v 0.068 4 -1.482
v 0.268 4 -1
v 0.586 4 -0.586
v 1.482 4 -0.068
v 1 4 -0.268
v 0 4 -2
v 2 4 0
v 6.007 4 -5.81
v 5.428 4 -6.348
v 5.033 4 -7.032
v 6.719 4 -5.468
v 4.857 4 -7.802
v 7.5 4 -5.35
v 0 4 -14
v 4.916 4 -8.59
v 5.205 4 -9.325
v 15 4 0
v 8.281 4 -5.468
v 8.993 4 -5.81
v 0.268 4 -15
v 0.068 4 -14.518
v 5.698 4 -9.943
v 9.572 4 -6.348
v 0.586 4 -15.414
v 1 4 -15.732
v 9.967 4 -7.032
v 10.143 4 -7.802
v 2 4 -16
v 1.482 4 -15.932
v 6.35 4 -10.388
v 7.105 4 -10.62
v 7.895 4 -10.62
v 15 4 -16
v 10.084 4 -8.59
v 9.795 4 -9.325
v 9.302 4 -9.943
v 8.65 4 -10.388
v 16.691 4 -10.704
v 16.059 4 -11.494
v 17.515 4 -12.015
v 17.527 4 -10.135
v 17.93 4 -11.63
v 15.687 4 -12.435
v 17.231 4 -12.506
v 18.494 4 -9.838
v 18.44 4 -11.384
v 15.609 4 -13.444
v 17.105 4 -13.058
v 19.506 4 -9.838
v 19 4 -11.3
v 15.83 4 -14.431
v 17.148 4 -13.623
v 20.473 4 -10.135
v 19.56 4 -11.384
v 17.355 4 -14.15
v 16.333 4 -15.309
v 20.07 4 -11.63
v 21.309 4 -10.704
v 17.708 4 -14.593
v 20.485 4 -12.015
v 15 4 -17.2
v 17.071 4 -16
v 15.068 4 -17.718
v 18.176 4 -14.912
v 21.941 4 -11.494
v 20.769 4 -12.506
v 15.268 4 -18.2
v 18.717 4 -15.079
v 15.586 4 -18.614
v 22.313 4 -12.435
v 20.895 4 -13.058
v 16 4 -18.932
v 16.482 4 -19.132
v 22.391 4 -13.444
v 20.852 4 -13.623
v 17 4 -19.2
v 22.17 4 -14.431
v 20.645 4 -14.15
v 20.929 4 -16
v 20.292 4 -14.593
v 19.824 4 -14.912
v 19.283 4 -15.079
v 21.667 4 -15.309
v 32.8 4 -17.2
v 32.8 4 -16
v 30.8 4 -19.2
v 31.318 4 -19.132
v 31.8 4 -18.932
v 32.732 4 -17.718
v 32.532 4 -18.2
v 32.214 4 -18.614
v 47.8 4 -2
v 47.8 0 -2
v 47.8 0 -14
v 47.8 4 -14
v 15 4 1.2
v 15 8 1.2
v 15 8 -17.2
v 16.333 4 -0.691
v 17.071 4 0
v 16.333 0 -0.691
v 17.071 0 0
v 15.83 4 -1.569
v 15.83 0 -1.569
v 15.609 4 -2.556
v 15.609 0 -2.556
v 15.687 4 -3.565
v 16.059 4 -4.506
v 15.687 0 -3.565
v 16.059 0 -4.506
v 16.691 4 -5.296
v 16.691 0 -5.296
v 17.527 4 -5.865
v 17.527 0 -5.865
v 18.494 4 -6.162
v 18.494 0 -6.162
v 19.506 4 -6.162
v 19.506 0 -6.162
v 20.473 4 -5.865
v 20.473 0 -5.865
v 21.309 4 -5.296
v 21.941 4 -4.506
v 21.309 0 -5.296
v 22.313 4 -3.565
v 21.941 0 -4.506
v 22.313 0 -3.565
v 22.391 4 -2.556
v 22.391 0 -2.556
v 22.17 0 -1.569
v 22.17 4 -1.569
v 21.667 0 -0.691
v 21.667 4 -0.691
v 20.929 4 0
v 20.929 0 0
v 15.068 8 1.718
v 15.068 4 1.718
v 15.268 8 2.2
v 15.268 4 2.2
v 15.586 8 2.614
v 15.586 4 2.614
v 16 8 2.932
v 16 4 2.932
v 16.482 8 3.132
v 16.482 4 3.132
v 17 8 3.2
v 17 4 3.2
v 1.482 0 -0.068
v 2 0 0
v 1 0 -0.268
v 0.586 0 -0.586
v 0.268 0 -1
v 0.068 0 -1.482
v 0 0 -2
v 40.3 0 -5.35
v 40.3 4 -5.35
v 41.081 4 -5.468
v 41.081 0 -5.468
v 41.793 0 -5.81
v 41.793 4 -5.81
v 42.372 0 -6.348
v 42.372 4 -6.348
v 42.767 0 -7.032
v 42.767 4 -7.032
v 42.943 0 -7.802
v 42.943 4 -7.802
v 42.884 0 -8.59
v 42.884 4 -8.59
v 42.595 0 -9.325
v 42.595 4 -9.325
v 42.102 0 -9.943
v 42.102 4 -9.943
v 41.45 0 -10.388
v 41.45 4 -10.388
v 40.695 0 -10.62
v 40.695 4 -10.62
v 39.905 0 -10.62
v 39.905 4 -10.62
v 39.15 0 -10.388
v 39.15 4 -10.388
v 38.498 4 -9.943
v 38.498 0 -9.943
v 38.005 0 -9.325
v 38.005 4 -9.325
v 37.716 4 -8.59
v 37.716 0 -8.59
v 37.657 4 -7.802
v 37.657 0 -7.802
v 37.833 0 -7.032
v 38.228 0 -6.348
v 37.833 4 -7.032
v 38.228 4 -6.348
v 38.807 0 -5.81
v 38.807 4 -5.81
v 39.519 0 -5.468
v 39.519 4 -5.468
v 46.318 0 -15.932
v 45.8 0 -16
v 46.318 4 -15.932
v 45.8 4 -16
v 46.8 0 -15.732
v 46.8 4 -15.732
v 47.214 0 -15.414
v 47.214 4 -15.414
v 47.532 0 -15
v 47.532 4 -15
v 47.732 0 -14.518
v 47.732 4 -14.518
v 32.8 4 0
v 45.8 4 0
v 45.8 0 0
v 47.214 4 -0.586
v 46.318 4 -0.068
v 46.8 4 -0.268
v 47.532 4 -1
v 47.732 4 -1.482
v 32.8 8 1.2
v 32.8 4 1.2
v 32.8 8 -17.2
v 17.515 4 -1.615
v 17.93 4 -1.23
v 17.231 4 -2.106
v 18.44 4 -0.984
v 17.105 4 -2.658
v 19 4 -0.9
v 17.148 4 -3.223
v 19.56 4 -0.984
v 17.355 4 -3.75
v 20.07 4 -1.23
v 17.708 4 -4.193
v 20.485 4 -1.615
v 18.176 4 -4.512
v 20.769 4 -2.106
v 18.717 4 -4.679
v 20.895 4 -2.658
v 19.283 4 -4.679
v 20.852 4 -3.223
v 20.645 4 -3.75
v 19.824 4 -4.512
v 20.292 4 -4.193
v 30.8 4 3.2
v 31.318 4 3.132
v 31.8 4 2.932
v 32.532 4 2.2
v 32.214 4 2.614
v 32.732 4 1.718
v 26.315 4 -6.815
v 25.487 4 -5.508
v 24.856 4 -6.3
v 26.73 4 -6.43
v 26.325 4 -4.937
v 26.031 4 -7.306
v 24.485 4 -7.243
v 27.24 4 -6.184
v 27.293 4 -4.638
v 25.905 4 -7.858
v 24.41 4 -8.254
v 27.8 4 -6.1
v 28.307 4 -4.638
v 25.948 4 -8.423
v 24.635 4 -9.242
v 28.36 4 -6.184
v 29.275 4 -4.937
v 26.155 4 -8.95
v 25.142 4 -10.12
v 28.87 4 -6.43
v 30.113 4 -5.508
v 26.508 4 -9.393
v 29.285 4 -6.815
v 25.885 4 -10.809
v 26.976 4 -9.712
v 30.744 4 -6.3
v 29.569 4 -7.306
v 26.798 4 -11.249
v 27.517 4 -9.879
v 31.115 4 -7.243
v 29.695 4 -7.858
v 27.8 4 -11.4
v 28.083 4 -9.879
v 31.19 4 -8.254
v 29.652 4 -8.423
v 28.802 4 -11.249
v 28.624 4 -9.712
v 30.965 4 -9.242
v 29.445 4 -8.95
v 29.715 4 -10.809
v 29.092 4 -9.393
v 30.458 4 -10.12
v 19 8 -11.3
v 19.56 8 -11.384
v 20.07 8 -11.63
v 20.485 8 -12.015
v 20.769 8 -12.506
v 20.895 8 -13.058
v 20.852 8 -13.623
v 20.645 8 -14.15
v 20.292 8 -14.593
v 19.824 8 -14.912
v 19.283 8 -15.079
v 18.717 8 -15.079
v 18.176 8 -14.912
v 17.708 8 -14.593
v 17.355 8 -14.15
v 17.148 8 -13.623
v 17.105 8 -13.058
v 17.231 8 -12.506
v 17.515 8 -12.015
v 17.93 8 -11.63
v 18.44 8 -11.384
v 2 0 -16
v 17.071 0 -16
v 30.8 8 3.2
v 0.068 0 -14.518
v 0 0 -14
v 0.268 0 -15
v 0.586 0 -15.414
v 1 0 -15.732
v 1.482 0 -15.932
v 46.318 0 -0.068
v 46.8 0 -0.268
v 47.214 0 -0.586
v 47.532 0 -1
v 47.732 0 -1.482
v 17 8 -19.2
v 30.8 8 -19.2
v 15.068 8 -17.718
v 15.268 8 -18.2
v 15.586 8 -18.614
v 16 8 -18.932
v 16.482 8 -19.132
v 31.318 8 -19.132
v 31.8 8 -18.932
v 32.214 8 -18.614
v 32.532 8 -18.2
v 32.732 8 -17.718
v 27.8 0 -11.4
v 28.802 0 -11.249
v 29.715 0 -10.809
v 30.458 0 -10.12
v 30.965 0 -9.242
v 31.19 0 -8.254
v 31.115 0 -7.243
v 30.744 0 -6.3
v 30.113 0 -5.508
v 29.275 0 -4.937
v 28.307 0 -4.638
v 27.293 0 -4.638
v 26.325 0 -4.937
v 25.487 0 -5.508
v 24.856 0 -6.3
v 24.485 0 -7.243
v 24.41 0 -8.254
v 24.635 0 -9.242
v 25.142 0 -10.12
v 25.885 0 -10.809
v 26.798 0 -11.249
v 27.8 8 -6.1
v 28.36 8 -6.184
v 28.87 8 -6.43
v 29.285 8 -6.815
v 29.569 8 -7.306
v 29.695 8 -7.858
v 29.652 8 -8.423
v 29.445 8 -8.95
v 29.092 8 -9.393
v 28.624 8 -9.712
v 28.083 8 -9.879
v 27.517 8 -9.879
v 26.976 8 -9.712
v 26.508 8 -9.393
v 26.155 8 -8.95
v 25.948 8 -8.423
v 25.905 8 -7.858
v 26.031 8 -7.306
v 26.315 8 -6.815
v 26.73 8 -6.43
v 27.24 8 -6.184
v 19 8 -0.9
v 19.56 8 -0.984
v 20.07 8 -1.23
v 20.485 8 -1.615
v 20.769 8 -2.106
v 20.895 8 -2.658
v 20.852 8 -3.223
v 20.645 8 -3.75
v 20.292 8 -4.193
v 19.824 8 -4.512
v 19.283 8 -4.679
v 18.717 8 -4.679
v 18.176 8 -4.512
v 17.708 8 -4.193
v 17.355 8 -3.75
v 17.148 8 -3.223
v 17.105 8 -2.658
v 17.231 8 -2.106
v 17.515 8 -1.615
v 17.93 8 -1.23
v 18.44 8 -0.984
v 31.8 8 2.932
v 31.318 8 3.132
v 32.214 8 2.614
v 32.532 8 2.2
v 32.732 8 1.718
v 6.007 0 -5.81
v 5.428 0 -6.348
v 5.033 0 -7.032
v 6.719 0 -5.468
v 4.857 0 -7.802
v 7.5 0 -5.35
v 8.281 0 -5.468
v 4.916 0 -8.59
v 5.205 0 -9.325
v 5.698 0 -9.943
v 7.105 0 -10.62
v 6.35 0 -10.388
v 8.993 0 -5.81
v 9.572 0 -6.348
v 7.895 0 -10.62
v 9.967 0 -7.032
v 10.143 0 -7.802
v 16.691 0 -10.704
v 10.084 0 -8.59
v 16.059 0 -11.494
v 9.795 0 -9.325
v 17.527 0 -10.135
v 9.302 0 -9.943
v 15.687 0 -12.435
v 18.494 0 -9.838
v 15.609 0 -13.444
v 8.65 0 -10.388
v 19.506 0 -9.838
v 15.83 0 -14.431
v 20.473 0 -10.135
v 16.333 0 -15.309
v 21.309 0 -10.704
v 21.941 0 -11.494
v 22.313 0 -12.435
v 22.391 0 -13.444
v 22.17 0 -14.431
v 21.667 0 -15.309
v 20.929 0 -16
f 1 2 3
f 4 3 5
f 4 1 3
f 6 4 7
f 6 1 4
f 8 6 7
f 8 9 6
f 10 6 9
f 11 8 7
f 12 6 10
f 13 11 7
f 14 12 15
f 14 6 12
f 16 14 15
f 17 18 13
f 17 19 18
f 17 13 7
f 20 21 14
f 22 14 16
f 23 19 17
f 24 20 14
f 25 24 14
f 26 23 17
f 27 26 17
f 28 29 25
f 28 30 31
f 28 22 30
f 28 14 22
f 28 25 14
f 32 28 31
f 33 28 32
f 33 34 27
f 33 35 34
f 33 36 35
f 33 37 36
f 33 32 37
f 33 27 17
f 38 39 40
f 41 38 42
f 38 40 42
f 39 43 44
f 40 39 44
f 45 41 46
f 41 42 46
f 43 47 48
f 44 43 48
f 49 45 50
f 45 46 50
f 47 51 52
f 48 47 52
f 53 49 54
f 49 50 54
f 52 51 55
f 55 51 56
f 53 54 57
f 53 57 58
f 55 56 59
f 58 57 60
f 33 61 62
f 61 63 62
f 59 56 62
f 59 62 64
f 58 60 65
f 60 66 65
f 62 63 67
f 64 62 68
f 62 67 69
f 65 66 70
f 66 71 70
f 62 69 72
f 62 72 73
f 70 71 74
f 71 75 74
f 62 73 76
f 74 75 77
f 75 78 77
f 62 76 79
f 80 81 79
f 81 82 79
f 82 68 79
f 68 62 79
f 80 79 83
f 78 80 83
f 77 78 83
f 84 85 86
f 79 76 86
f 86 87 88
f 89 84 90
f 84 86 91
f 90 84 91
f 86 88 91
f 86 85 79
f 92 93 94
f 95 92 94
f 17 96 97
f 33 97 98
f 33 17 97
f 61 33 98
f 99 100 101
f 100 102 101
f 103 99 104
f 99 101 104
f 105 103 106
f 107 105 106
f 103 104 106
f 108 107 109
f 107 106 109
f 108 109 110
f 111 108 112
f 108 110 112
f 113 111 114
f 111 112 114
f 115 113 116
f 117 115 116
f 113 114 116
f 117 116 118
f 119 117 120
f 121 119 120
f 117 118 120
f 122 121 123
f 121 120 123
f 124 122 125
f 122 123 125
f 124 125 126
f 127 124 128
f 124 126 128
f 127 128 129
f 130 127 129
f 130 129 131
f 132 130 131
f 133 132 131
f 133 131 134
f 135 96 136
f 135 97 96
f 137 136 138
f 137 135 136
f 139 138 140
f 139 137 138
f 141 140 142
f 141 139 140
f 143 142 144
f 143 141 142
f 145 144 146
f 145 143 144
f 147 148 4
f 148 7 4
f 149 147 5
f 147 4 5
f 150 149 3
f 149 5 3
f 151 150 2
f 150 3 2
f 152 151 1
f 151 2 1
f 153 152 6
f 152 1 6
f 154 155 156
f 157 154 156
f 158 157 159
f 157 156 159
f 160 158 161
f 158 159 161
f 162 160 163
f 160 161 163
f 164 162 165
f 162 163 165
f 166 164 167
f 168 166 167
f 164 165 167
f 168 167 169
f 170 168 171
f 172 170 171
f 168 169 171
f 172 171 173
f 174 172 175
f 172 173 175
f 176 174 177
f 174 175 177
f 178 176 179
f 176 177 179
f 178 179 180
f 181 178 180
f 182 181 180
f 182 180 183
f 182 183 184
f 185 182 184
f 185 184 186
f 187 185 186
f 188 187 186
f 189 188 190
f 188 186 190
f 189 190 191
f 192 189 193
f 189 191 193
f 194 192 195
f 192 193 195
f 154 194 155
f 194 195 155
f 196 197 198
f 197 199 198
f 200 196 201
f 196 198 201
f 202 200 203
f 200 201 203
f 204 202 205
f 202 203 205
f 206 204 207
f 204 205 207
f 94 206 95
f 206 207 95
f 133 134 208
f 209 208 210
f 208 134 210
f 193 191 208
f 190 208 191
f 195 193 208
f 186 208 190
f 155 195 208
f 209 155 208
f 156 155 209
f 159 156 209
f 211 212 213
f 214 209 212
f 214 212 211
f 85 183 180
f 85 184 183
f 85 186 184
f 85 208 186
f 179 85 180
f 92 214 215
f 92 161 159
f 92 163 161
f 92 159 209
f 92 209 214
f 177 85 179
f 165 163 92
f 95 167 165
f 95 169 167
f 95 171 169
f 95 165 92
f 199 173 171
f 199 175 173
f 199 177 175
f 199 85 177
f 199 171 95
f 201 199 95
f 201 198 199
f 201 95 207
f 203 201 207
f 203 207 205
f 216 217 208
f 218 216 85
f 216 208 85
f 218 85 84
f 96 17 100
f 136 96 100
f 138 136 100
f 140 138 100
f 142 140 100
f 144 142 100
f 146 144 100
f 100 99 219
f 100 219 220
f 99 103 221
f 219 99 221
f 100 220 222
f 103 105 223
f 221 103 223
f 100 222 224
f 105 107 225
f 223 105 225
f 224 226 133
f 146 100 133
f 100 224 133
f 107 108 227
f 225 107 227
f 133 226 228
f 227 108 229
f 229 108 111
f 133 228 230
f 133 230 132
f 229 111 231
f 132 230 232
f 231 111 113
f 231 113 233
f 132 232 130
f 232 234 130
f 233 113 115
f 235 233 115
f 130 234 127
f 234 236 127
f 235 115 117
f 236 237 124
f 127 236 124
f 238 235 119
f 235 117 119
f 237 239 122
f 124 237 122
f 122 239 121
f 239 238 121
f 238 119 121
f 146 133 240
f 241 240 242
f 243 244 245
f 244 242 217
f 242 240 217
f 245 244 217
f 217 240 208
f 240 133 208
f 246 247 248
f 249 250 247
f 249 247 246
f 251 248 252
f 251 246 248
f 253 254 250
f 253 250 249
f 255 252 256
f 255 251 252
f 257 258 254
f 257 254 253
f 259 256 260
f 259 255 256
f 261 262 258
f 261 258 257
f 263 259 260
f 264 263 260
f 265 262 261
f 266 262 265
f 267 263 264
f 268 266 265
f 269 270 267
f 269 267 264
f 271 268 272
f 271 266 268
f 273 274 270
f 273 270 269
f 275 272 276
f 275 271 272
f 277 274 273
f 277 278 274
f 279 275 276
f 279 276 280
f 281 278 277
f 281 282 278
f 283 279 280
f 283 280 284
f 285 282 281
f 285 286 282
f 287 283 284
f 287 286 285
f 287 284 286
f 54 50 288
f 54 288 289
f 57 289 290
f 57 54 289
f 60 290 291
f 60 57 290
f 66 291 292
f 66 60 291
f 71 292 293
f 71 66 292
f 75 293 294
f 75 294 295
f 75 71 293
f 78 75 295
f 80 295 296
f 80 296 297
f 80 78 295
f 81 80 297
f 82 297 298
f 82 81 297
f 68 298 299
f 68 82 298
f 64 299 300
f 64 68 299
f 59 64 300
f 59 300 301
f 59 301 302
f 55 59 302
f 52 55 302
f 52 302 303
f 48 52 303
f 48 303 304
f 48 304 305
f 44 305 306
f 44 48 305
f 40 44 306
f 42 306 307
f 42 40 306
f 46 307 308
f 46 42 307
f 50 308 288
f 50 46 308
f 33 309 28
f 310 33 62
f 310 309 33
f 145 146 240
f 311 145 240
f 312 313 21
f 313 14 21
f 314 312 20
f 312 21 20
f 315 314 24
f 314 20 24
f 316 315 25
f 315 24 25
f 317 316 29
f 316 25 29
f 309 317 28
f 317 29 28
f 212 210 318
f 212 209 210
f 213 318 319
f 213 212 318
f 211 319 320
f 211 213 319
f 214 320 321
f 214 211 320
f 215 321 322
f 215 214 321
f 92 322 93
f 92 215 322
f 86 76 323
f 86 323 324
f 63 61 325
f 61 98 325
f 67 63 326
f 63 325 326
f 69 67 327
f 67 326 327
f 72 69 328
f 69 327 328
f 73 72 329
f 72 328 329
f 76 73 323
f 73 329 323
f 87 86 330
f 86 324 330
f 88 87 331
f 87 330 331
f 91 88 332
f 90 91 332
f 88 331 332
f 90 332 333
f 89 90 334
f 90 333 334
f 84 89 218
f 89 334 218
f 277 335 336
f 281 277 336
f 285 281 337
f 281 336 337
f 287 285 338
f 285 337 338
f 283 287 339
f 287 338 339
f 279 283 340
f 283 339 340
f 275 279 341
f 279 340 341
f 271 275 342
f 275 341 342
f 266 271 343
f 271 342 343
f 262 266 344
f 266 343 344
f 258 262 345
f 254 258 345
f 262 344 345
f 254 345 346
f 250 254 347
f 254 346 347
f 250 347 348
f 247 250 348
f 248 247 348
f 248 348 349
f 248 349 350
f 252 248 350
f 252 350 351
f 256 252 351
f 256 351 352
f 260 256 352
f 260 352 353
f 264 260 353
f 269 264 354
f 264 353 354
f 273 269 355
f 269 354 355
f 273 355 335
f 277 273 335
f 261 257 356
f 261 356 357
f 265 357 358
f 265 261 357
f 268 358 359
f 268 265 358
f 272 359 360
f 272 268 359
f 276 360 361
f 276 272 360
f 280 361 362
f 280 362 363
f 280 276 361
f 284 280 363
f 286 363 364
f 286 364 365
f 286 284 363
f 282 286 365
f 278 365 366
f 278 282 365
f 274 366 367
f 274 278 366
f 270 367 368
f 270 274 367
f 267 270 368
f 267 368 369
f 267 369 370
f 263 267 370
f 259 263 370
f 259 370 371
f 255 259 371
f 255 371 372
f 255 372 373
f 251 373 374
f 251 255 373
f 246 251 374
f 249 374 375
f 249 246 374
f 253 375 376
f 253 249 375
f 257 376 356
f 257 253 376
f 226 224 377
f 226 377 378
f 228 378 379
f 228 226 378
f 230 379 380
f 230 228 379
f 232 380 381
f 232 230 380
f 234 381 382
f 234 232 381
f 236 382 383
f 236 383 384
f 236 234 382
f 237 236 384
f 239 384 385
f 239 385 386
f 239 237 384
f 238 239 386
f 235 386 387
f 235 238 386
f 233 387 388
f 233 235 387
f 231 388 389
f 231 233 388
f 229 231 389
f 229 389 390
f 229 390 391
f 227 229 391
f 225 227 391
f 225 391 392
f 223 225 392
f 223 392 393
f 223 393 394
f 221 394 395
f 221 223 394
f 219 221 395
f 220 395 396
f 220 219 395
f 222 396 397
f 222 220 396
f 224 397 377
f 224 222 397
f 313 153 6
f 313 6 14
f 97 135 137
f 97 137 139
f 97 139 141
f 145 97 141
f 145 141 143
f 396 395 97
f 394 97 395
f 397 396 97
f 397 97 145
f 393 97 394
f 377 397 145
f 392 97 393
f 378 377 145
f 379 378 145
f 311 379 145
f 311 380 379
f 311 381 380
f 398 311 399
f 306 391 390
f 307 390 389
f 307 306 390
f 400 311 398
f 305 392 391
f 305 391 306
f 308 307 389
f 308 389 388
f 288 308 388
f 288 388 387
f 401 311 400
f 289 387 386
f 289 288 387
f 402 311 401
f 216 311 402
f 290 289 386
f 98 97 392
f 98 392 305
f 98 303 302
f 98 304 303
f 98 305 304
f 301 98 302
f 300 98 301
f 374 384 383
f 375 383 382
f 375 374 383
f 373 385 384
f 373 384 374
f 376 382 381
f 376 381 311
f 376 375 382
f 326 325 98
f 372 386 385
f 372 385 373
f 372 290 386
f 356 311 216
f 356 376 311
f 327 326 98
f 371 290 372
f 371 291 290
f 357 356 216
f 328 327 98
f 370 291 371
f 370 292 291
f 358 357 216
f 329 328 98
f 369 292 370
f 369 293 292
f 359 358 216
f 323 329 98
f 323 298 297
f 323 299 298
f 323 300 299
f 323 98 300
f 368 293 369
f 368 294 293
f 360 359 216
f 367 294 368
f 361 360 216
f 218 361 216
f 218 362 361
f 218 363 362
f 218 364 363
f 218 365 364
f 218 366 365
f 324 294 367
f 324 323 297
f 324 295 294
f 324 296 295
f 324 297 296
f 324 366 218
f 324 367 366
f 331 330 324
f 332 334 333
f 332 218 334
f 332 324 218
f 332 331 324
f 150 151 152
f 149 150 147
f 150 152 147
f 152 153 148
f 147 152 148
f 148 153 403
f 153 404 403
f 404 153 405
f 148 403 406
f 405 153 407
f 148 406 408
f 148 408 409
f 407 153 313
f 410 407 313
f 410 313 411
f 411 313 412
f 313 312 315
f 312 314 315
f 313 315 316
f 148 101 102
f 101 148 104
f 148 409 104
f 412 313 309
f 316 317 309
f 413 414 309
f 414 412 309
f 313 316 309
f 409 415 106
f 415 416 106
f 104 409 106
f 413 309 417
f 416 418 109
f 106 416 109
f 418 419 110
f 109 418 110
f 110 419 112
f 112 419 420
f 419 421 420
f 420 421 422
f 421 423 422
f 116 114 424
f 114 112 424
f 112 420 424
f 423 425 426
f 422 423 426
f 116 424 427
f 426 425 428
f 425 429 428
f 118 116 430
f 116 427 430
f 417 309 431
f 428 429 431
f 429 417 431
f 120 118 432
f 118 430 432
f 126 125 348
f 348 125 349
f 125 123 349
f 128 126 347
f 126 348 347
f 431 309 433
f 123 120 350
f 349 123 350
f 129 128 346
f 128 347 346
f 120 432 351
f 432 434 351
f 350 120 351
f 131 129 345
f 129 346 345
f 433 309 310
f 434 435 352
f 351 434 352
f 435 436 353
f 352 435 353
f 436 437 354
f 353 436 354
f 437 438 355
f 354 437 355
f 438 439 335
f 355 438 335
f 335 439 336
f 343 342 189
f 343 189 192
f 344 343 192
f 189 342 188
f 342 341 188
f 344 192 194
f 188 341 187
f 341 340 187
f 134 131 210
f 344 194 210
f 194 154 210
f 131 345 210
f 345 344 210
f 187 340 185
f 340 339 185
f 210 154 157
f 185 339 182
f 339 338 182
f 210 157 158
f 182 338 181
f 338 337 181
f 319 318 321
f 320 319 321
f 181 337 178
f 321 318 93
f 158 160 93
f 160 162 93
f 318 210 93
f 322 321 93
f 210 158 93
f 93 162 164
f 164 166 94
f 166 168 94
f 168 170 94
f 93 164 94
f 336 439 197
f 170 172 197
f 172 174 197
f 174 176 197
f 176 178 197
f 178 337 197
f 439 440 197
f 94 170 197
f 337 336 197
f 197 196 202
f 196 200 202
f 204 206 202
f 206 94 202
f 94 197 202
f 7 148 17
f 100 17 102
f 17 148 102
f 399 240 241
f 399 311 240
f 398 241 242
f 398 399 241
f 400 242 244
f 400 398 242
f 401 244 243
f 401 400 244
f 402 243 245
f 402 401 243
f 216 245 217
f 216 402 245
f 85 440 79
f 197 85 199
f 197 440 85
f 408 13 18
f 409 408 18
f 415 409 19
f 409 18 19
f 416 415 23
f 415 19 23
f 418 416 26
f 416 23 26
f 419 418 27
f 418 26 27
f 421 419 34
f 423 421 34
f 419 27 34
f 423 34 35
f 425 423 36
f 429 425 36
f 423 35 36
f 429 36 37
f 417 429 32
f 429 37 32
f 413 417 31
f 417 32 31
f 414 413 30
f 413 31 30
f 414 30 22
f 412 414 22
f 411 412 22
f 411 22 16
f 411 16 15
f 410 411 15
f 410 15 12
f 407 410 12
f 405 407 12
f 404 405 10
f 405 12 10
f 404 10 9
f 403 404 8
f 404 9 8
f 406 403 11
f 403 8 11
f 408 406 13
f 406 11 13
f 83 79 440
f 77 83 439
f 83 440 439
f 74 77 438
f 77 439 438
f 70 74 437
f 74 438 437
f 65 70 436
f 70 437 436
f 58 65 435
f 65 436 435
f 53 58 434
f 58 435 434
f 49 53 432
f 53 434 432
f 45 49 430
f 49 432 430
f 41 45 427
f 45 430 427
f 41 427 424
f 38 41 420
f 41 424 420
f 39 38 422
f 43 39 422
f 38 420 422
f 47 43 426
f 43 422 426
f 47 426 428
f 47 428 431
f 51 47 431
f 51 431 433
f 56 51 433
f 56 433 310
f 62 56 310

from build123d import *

# Parameters (mm, degrees)
SKETCH1_W           = 47.8
SKETCH1_H           = 16
BOSS_EXTRUDE1_DEPTH = 4
SKETCH2_W           = 17.8
SKETCH2_H           = 22.4
SKETCH2_R           = 1.9
BOSS_EXTRUDE2_DEPTH = 4
SKETCH3_R           = 3.4
CUT_EXTRUDE1_DEPTH  = 4
SKETCH4_R           = 2.65
CUT_EXTRUDE2_DEPTH  = 4
FILLET1_R           = 2


with BuildPart() as part:
    # Sketch1 → Boss-Extrude1 (new body)
    with BuildSketch(Plane(origin=(0, 0, 0), x_dir=(1, 0, 0), z_dir=(0, 1, 0))):
        with Locations((23.9, 8)):
            Rectangle(SKETCH1_W, SKETCH1_H)
    extrude(amount=BOSS_EXTRUDE1_DEPTH)

    # Sketch2 → Boss-Extrude2 (add)
    with BuildSketch(Plane(origin=(0, 4, 0), x_dir=(1, 0, 0), z_dir=(0, 1, 0))):
        with Locations((23.9, 8)):
            Rectangle(SKETCH2_W, SKETCH2_H)
        with Locations(Location((19, 13.2, 0), (0, 0, 270))):
            Circle(SKETCH2_R, mode=Mode.SUBTRACT)
        with Locations(Location((27.8, 8, 0), (0, 0, 270))):
            Circle(SKETCH2_R, mode=Mode.SUBTRACT)
        with Locations(Location((19, 2.8, 0), (0, 0, 270))):
            Circle(SKETCH2_R, mode=Mode.SUBTRACT)
    extrude(amount=BOSS_EXTRUDE2_DEPTH)

    # Sketch3 → Cut-Extrude1 (cut)
    with BuildSketch(Plane.XZ):
        with Locations((19, -2.8)):
            Circle(SKETCH3_R)
        with Locations(Location((27.8, -8, 0), (0, 0, 270))):
            Circle(SKETCH3_R)
        with Locations((19, -13.2)):
            Circle(SKETCH3_R)
    extrude(amount=-CUT_EXTRUDE1_DEPTH, mode=Mode.SUBTRACT)

    # Sketch4 → Cut-Extrude2 (cut)
    with BuildSketch(Plane(origin=(0, 4, 0), x_dir=(1, 0, 0), z_dir=(0, 1, 0))):
        with Locations(Location((7.5, 8, 0), (0, 0, 270))):
            Circle(SKETCH4_R)
        with Locations(Location((40.3, 8, 0), (0, 0, 270))):
            Circle(SKETCH4_R)
    extrude(amount=-CUT_EXTRUDE2_DEPTH, mode=Mode.SUBTRACT)

    # Fillet1
    fillet1_edges = [part.edges().sort_by_distance(p)[0] for p in [
        (15, 6, -19.2),
        (15, 6, 3.2),
        (32.8, 6, 3.2),
        (32.8, 6, -19.2),
        (0, 2, -16),
        (47.8, 2, -16),
        (47.8, 2, 0),
        (0, 2, 0),
    ]]
    fillet(fillet1_edges, radius=FILLET1_R)


solid = part.part
